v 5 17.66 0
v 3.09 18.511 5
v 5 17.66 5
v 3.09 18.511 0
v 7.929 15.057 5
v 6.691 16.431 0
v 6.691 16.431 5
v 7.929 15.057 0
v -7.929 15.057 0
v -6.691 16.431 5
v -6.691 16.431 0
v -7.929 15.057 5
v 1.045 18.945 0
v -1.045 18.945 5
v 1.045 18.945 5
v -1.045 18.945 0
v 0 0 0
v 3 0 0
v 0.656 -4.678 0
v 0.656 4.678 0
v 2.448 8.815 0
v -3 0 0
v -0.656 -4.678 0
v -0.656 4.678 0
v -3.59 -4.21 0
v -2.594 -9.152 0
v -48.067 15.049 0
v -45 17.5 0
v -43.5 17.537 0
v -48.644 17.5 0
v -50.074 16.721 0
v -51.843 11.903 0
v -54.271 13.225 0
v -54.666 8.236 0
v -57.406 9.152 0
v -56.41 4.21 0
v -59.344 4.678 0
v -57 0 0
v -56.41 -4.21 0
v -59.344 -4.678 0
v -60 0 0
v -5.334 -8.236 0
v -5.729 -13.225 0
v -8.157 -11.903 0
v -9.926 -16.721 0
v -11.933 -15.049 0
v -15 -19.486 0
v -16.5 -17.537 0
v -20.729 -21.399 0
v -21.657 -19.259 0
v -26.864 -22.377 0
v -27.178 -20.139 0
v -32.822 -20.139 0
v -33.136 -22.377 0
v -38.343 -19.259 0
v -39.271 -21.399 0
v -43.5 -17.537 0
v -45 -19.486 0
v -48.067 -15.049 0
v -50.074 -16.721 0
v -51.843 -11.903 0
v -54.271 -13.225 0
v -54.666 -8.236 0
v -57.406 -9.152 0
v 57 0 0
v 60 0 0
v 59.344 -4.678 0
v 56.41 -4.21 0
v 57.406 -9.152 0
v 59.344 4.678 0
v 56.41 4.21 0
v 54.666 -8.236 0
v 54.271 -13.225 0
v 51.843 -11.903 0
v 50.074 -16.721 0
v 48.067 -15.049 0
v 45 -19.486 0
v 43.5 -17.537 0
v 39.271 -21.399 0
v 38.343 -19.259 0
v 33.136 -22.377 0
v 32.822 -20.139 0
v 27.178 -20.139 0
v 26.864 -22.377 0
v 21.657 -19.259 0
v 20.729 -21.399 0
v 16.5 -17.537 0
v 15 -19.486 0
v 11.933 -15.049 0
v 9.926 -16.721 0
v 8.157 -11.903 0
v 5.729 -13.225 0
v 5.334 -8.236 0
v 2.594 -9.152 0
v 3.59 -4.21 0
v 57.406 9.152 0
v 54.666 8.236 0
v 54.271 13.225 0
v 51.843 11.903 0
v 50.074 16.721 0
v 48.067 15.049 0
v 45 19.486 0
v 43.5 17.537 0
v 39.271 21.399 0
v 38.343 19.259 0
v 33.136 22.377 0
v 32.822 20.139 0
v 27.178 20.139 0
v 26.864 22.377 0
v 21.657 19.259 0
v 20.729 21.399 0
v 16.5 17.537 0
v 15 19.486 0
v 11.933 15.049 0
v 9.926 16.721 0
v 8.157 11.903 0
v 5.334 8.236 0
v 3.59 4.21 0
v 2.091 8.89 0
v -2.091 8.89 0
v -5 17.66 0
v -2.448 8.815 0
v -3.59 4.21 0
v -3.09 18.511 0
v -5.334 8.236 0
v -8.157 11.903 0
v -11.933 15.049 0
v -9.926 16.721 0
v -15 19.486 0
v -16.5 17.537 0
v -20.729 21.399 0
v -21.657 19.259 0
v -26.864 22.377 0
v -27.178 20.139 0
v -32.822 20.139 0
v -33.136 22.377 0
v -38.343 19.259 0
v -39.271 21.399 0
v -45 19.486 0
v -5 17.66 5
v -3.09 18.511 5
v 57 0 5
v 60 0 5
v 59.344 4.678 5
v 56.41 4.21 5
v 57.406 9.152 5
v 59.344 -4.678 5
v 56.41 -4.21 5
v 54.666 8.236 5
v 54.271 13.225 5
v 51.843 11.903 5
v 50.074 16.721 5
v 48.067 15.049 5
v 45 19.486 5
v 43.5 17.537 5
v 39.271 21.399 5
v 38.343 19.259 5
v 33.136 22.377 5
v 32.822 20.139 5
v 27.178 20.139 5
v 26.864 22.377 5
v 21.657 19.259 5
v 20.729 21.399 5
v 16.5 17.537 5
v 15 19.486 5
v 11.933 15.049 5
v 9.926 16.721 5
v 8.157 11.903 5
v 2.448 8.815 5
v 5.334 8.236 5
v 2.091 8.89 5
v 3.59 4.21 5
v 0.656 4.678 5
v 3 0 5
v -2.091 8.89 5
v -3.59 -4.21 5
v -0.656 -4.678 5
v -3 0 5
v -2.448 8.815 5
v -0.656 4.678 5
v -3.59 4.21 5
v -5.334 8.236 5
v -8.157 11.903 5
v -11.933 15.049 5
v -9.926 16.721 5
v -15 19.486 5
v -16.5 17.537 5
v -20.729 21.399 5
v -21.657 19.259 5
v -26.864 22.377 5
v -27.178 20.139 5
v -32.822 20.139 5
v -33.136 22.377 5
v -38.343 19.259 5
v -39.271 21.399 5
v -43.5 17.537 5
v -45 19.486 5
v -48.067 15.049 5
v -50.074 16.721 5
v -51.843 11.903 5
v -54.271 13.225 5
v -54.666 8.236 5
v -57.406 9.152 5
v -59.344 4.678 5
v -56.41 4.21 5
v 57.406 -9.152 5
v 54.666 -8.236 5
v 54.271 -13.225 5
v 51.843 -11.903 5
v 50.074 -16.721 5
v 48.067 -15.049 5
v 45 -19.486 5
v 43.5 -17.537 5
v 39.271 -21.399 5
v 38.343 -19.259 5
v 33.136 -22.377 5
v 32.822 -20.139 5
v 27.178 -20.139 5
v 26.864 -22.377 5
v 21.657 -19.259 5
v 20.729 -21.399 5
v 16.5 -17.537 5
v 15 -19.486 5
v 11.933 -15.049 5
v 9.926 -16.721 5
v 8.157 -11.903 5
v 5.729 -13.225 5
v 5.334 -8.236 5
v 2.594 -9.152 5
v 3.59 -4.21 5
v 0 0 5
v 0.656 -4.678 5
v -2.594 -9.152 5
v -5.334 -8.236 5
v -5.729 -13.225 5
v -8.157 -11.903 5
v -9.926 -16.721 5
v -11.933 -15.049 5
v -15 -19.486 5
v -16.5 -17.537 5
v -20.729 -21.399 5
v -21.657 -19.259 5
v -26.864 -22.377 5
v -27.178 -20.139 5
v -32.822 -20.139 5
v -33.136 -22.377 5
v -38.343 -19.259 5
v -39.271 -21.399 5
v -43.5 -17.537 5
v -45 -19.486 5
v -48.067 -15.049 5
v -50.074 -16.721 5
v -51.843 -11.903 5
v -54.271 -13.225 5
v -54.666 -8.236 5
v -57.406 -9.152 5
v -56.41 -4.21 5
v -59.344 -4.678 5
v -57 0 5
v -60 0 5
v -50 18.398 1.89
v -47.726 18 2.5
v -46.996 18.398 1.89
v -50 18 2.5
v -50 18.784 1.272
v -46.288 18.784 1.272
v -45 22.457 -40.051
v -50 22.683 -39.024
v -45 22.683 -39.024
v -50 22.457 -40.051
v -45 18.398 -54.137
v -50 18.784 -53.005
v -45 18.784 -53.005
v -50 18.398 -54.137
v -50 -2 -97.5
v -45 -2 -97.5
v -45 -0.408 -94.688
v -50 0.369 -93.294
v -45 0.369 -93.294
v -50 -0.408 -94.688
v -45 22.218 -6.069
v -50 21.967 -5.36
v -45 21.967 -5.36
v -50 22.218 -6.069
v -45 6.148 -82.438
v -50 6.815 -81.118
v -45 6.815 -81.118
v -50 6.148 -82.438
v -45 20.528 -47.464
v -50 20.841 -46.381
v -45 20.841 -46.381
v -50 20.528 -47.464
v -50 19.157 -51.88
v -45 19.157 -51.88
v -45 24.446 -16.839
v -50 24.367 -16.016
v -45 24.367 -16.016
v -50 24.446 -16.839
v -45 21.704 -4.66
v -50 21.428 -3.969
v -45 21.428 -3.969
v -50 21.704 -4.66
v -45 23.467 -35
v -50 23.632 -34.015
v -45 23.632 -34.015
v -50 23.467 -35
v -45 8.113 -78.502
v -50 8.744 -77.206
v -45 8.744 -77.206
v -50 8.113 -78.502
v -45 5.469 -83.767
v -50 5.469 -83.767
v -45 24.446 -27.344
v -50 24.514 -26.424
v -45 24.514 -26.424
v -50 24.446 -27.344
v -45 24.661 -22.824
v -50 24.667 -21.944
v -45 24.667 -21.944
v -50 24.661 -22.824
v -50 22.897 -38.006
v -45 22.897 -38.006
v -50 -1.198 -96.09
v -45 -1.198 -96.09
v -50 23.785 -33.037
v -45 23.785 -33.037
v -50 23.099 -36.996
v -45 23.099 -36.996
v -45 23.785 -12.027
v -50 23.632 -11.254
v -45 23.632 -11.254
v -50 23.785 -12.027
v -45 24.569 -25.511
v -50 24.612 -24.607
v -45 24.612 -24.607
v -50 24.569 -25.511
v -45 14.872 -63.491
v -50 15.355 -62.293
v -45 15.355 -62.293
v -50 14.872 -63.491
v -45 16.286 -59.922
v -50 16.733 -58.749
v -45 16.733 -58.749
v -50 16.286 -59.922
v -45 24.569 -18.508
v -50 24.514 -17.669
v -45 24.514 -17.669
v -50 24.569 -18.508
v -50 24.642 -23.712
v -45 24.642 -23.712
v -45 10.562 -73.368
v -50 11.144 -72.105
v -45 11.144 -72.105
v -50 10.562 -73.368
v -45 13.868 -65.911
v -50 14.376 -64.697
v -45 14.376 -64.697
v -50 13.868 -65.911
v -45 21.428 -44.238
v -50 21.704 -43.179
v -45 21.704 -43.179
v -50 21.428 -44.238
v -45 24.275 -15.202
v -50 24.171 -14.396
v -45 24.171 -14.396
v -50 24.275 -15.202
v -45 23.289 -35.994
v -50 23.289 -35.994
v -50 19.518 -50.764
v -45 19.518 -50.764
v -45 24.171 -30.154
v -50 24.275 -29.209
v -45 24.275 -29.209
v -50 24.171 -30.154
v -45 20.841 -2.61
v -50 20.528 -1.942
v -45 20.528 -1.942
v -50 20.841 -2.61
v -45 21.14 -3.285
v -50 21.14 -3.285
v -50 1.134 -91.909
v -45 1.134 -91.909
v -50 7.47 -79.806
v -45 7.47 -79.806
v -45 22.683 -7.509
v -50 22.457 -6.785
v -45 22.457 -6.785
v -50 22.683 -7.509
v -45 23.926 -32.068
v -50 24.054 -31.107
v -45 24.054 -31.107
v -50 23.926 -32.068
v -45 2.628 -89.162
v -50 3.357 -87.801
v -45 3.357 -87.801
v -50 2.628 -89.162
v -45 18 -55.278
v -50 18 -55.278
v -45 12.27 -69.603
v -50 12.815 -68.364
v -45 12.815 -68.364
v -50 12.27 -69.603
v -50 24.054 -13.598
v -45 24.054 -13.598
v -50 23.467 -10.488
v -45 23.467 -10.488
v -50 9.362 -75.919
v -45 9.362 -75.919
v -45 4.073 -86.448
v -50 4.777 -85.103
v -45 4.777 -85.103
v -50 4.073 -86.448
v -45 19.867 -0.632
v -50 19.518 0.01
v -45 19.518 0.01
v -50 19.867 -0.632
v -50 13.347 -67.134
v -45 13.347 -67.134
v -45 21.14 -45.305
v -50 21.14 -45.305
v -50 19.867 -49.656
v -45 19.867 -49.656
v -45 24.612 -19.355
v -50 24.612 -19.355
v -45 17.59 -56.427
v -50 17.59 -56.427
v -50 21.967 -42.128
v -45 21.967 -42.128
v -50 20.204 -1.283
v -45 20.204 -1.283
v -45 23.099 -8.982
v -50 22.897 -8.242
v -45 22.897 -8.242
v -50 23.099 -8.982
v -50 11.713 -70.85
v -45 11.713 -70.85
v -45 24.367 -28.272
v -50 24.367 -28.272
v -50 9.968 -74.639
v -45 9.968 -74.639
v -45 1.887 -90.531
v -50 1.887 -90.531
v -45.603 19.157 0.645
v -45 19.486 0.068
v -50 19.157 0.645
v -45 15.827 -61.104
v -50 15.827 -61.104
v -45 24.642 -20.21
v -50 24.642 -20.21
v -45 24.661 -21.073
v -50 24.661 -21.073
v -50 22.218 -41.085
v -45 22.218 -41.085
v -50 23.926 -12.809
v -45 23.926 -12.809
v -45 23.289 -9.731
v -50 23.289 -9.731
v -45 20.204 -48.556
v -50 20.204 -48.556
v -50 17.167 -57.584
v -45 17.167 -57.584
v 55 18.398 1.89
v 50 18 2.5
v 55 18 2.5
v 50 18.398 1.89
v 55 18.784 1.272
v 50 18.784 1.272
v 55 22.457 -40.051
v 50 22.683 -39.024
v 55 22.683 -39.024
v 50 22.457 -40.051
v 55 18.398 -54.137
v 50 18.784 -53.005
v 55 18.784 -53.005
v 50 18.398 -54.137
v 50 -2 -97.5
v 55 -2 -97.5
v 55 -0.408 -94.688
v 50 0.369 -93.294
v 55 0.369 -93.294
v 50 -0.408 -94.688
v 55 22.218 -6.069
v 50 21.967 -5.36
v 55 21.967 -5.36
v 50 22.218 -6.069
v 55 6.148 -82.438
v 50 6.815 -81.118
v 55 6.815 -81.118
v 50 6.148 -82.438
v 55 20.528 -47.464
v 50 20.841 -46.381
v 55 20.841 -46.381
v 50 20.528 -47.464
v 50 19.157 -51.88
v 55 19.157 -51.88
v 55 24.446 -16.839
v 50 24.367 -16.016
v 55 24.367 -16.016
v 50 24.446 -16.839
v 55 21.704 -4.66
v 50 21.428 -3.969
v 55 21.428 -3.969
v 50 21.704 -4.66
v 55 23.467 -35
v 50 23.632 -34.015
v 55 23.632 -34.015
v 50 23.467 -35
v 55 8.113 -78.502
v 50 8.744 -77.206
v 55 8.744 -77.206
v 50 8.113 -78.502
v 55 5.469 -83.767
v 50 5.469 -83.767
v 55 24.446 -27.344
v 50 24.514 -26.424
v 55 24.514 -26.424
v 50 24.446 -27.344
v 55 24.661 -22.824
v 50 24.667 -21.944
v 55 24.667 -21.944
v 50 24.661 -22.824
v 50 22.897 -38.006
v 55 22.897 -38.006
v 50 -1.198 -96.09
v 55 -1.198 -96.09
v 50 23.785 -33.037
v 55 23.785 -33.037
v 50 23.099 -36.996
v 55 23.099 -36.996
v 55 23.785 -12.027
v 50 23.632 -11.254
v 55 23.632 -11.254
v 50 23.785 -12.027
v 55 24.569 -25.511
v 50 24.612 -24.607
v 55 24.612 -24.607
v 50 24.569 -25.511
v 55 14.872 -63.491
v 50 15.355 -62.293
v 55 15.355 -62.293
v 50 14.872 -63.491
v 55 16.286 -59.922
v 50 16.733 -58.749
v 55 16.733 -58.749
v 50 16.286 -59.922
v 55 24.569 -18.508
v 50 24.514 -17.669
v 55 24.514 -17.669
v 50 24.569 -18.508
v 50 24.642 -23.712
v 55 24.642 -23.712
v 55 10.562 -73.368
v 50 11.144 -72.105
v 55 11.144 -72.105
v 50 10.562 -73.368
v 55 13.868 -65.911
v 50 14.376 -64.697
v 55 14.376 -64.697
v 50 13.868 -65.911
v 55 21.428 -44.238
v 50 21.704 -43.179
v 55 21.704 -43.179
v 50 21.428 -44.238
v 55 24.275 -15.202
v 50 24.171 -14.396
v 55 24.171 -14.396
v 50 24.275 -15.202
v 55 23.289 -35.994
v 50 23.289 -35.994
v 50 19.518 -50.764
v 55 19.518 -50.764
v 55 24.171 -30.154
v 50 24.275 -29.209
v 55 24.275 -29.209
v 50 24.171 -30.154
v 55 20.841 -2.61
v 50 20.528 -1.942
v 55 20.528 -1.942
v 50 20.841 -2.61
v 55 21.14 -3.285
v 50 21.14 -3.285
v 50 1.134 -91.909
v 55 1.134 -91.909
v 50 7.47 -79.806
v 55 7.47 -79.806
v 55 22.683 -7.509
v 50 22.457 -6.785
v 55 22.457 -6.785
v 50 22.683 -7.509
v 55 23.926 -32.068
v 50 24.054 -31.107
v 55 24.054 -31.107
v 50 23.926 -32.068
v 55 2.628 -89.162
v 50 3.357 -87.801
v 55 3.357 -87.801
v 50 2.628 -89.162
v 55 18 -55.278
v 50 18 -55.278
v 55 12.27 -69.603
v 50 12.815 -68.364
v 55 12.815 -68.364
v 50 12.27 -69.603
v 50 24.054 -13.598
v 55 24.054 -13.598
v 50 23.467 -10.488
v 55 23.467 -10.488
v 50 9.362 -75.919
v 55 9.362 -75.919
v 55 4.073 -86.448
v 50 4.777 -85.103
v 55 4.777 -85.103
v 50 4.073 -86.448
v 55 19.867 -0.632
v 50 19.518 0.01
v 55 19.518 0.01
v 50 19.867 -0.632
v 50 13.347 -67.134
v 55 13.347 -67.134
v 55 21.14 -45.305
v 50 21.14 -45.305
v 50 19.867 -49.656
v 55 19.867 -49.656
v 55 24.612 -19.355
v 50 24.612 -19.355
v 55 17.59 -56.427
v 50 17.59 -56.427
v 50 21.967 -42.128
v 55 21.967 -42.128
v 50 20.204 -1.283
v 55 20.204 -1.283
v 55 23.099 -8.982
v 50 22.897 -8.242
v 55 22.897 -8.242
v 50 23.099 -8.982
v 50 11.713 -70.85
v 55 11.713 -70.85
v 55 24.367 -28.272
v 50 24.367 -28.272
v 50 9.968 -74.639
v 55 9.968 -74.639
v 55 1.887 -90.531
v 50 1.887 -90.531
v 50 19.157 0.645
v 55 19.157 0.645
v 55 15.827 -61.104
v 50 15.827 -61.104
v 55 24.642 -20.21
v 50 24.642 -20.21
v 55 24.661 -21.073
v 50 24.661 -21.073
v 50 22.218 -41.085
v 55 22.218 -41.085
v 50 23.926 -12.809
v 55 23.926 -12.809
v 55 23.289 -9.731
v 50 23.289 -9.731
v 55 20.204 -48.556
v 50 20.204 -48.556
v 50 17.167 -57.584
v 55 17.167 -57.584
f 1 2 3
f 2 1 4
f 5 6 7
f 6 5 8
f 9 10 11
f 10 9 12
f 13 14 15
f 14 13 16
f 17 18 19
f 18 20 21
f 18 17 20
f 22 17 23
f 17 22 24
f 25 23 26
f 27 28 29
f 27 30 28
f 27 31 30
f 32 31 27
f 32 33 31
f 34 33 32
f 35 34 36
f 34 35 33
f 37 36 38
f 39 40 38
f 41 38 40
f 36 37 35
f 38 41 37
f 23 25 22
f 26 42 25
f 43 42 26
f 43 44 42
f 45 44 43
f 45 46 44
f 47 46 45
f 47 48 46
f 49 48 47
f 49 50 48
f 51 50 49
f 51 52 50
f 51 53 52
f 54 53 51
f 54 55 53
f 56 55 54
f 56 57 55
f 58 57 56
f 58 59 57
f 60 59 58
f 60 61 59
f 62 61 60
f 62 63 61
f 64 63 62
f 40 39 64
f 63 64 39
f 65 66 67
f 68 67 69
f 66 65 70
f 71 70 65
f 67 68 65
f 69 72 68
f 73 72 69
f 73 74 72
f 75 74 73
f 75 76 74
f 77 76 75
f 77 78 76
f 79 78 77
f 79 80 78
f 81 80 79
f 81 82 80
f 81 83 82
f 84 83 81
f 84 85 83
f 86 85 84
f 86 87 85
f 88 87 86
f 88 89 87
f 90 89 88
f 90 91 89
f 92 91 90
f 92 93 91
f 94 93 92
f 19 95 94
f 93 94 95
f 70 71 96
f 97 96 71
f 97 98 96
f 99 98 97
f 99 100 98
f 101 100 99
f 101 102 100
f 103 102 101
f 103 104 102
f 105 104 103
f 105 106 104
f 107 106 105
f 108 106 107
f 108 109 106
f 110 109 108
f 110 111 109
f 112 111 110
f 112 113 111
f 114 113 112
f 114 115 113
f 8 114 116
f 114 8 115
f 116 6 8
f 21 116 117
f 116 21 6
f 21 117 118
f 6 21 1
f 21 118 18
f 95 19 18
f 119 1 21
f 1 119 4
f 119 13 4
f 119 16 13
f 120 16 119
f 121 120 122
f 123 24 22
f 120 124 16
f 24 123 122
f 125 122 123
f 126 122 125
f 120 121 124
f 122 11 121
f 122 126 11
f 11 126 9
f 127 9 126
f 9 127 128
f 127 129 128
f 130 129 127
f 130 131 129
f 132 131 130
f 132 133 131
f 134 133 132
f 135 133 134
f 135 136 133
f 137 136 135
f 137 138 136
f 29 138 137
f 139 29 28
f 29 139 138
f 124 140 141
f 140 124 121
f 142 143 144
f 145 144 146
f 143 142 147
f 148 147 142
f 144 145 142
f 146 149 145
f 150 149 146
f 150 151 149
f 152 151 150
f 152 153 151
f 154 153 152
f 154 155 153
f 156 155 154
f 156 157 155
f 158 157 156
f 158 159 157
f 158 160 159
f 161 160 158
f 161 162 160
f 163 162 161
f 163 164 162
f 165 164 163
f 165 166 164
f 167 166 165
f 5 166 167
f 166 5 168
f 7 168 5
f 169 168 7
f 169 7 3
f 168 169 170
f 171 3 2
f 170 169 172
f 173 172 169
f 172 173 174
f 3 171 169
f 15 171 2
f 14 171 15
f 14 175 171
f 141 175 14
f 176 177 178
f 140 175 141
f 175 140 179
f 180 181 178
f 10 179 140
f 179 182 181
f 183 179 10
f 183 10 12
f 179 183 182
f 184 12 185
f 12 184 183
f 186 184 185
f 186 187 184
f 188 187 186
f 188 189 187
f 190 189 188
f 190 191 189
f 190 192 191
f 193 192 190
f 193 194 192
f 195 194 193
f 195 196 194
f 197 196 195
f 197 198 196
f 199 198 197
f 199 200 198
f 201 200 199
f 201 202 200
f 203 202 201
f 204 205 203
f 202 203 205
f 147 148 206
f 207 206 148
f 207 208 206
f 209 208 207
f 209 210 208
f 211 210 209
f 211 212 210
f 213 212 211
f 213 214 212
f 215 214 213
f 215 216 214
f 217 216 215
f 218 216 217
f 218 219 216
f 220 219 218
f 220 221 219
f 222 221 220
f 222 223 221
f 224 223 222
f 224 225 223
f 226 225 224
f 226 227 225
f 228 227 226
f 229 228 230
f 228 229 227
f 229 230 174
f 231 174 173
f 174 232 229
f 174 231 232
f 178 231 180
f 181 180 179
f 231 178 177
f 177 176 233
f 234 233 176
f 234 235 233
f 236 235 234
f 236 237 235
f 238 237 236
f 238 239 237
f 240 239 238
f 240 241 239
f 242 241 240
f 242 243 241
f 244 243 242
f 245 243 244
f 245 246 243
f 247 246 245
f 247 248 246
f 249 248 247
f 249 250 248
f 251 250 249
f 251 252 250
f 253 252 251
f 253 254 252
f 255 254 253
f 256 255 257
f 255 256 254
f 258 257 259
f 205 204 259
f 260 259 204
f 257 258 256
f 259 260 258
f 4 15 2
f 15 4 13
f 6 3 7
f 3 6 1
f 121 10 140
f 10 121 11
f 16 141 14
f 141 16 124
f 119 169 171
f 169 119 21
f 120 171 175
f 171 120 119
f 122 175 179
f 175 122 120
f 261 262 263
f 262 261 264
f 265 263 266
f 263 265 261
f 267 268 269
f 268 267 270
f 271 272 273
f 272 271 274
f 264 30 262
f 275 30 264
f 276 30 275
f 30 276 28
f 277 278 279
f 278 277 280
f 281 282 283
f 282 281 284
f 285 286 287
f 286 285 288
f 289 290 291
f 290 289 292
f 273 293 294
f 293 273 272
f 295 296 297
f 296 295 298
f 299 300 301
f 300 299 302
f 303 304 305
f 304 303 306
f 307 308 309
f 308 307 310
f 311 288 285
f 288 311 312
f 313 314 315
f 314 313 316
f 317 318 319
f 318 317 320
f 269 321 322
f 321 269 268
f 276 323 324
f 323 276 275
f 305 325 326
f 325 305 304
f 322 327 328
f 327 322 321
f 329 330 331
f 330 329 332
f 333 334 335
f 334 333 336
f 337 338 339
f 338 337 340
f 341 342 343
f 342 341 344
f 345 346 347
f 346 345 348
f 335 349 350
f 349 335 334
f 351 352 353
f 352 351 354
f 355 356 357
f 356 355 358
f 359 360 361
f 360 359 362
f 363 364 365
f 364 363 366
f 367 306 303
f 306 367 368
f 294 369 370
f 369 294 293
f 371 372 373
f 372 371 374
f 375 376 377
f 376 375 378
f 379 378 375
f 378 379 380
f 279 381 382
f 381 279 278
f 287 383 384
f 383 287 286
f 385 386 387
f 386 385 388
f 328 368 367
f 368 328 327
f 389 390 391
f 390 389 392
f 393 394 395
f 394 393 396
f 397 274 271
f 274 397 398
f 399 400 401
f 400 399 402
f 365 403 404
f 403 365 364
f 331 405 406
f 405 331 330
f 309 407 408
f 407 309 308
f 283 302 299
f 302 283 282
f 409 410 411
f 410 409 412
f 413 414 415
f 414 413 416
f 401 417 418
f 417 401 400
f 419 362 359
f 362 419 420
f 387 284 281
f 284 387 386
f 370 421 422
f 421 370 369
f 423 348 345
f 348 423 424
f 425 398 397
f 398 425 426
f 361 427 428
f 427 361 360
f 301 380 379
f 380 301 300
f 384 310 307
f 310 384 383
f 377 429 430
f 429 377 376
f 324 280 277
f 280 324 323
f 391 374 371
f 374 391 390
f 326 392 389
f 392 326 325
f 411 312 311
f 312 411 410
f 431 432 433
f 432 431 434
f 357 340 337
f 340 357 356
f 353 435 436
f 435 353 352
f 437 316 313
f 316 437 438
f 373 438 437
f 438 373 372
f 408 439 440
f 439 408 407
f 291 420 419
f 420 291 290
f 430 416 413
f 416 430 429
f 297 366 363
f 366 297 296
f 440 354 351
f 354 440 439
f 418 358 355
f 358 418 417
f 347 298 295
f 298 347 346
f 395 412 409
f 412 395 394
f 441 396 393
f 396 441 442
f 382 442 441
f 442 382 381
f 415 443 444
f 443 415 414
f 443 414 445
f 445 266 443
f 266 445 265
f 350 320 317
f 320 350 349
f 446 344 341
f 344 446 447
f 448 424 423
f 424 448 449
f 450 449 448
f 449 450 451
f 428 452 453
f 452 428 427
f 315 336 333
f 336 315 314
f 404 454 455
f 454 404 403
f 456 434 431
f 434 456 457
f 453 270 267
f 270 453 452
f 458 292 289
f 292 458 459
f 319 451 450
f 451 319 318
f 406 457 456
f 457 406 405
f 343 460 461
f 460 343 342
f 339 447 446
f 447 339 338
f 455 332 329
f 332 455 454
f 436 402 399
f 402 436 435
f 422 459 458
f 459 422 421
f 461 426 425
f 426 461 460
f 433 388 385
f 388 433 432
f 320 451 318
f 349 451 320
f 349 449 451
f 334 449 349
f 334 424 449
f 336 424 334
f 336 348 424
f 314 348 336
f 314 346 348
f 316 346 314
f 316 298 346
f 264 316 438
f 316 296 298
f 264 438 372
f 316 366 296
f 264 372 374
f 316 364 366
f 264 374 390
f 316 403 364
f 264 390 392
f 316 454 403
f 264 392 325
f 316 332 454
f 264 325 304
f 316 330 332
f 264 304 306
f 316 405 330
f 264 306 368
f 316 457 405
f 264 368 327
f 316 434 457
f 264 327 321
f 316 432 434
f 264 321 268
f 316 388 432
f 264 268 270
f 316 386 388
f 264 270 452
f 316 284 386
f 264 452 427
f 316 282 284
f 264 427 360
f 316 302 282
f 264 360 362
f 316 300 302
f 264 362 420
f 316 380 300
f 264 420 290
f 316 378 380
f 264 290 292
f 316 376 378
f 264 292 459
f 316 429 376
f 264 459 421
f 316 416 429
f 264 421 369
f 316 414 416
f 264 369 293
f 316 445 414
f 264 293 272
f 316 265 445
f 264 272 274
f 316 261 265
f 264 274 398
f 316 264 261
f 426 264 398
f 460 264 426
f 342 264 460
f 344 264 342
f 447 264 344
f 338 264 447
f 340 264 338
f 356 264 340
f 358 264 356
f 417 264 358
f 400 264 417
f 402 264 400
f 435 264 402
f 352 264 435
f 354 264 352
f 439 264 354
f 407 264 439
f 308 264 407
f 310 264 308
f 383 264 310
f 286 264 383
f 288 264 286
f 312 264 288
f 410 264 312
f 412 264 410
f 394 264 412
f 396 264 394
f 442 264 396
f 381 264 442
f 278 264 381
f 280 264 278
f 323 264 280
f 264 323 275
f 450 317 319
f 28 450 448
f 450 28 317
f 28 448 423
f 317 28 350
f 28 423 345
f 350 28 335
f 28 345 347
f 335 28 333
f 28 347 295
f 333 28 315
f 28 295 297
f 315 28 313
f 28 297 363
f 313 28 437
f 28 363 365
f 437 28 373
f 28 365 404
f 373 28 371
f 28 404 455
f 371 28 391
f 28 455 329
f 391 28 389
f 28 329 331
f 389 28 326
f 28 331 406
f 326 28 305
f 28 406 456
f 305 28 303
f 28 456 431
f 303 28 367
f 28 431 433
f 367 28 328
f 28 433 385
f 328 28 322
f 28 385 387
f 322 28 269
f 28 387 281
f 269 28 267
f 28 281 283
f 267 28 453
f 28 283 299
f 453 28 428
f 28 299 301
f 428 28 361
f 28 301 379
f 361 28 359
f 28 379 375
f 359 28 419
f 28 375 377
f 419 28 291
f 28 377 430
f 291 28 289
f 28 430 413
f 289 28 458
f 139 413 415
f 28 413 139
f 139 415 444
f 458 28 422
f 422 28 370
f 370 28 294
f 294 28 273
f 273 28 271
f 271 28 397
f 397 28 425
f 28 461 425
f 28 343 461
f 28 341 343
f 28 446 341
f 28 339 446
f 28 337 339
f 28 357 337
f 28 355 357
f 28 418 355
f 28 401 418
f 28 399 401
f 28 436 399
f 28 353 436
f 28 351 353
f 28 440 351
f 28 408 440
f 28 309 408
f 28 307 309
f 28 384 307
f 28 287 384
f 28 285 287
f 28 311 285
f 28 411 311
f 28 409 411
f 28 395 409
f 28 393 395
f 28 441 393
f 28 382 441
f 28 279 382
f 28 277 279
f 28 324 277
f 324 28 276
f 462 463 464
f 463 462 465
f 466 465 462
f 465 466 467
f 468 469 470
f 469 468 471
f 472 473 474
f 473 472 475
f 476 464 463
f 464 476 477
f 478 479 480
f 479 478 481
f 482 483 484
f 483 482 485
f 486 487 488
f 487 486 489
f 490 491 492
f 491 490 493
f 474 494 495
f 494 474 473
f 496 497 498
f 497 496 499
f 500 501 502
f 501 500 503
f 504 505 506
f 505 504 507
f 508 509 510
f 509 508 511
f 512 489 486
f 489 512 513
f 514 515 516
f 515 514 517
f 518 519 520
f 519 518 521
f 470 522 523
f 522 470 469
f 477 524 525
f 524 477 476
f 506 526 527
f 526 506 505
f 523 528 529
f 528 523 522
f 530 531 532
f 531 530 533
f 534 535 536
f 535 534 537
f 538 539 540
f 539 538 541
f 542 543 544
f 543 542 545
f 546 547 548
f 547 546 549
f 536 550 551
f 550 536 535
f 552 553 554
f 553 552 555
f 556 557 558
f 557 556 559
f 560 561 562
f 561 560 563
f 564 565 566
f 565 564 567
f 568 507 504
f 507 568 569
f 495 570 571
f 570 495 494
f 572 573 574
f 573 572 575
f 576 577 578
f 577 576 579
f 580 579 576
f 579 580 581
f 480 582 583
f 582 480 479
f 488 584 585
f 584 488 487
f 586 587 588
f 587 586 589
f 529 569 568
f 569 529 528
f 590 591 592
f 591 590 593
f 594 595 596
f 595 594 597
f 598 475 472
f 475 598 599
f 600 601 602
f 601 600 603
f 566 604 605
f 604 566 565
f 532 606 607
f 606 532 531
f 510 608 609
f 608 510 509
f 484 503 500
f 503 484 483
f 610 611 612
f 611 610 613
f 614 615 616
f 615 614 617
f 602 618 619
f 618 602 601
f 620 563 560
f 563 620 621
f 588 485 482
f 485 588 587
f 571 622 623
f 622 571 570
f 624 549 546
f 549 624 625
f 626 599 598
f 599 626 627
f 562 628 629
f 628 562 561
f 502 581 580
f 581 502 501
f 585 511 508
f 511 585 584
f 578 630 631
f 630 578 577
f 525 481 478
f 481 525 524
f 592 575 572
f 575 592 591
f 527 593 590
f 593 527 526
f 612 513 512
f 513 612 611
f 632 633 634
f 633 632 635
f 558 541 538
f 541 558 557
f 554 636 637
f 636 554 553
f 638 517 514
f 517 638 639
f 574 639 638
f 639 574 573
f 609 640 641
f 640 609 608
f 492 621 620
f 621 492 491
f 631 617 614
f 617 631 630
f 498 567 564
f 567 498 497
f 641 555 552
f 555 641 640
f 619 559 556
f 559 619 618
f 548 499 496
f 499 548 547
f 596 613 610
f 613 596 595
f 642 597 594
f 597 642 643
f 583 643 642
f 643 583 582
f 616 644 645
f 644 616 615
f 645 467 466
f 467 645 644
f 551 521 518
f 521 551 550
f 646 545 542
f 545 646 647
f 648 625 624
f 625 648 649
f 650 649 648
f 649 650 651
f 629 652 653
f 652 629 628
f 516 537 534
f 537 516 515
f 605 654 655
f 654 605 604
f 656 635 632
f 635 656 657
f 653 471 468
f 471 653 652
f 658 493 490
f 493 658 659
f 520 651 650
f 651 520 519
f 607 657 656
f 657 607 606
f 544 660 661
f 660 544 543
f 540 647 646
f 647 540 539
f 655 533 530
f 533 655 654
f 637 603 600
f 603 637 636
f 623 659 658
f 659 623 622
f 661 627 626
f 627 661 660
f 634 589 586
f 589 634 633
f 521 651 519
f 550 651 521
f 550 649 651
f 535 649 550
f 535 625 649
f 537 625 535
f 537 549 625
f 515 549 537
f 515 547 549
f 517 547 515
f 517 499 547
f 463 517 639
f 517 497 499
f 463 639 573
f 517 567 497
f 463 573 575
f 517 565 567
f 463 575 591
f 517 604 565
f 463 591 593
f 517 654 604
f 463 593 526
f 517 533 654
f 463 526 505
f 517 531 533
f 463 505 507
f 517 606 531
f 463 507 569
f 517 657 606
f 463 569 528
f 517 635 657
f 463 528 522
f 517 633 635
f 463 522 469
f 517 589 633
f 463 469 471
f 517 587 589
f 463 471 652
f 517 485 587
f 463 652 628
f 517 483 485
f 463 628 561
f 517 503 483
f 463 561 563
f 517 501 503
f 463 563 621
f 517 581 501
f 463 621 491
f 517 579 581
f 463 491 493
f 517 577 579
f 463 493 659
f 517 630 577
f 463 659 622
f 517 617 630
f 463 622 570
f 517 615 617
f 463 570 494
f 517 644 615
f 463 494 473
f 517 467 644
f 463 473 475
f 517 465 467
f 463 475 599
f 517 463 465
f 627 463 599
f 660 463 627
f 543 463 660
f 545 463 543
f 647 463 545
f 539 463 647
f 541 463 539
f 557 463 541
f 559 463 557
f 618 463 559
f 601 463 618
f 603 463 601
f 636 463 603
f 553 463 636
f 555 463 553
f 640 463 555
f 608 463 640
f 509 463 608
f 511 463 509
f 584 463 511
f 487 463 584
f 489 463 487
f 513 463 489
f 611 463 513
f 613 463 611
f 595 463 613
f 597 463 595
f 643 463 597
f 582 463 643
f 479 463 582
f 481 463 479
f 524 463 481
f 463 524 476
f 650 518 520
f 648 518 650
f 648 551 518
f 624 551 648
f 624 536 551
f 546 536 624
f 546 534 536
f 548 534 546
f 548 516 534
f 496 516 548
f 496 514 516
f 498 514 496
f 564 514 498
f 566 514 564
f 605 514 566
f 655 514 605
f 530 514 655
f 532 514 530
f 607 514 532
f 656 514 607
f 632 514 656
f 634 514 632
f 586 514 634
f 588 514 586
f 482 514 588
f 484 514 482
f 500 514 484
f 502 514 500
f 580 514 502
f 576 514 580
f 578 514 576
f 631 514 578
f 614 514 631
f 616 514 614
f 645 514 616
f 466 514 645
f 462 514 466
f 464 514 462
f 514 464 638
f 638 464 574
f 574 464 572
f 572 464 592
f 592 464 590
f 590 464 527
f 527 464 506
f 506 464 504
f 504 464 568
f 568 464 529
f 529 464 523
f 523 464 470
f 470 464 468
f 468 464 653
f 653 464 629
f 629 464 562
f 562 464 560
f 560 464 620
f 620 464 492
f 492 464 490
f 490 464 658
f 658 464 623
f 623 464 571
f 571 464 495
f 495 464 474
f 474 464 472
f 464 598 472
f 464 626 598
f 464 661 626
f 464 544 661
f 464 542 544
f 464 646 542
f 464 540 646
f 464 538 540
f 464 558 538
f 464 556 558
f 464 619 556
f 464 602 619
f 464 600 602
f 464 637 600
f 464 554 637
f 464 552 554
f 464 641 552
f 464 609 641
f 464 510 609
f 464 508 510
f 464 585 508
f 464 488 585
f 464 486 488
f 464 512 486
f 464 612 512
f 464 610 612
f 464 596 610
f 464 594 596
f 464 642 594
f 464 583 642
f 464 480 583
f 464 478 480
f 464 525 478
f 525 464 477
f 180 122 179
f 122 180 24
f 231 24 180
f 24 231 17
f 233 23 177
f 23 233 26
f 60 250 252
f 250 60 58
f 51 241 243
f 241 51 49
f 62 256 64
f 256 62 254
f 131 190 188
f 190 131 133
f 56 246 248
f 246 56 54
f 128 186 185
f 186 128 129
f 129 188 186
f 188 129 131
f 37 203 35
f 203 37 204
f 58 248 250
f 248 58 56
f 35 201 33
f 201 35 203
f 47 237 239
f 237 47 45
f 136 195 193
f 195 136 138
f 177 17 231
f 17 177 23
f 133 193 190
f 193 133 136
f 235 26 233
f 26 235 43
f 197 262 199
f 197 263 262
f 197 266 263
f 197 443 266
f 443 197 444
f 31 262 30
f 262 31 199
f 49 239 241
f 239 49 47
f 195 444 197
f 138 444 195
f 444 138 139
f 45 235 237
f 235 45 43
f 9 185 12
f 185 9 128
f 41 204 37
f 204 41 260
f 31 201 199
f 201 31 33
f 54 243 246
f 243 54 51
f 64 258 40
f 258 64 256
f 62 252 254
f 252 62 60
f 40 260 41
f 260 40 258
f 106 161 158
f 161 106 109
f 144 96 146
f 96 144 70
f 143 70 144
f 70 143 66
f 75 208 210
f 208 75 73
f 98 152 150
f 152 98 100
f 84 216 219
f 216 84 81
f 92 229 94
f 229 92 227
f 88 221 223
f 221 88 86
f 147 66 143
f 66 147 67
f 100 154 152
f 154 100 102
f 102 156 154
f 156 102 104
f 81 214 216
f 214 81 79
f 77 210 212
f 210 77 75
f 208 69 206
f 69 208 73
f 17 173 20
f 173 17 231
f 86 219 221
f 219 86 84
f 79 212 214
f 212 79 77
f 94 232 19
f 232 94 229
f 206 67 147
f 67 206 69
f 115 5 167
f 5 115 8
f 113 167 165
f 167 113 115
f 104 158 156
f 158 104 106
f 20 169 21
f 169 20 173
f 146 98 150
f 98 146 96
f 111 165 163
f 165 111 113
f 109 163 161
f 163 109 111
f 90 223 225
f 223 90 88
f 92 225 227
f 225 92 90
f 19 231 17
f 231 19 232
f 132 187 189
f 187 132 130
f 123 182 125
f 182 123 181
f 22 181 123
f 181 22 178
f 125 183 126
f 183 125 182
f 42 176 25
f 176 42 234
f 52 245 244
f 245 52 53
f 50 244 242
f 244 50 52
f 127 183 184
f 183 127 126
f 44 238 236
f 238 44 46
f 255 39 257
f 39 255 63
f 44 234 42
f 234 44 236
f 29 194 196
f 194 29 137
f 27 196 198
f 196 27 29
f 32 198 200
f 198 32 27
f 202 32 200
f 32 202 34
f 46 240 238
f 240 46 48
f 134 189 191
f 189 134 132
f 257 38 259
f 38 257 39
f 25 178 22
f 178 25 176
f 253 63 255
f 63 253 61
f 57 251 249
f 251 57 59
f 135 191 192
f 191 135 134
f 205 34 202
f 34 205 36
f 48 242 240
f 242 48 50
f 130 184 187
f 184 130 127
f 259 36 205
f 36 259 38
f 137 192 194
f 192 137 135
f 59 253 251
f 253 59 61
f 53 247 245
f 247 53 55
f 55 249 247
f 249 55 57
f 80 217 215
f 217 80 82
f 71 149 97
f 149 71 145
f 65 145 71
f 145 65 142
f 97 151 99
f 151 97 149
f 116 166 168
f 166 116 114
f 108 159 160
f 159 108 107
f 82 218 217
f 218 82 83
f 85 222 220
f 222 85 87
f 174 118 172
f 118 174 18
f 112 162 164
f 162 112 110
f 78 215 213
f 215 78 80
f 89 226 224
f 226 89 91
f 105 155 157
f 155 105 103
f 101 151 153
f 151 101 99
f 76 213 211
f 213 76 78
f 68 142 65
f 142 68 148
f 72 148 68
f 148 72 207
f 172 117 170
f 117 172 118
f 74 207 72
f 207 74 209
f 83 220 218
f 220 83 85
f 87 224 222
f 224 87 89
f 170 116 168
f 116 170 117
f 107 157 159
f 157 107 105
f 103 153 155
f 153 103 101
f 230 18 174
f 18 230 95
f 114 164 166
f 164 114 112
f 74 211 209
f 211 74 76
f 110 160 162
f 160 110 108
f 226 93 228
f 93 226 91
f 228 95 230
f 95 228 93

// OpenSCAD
difference() {
	union() {
		translate(v = [-30.0000000000, 0, 0]) {
			scale(v = [0.6000000000, 0.4500000000, 1]) {
				cylinder(h = 5, r = 50);
			}
		}
		translate(v = [30.0000000000, 0, 0]) {
			scale(v = [0.6000000000, 0.4500000000, 1]) {
				cylinder(h = 5, r = 50);
			}
		}
		translate(v = [0, 9.0000000000, 0]) {
			difference() {
				cylinder(h = 5, r = 10.0000000000);
				translate(v = [0, -20, 0]) {
					cylinder(h = 5, r = 20);
				}
			}
		}
		translate(v = [-50.0000000000, 18.0000000000, 2.5000000000]) {
			rotate(a = [90, 90, 90]) {
				difference() {
					linear_extrude(height = 5) {
						polygon(points = [[0.0000000000, 0.0000000000], [0.6101418223, 0.3979185797], [1.2284460769, 0.7835935109], [1.8549127640, 1.1570247934], [2.4895418835, 1.5182124273], [3.1323334354, 1.8671564126], [3.7832874197, 2.2038567493], [4.4424038363, 2.5283134374], [5.1096826854, 2.8405264769], [5.7851239669, 3.1404958678], [6.4687276808, 3.4282216100], [7.1604938272, 3.7037037037], [7.8604224059, 3.9669421488], [8.5685134170, 4.2179369452], [9.2847668605, 4.4566880931], [10.0091827365, 4.6831955923], [10.7417610448, 4.8974594429], [11.4825017855, 5.0994796449], [12.2314049587, 5.2892561983], [12.9884705642, 5.4667891032], [13.7536986022, 5.6320783594], [14.5270890725, 5.7851239669], [15.3086419753, 5.9259259259], [16.0983573105, 6.0544842363], [16.8962350781, 6.1707988981], [17.7022752780, 6.2748699112], [18.5164779104, 6.3666972758], [19.3388429752, 6.4462809917], [20.1693704724, 6.5136210591], [21.0080604020, 6.5687174778], [21.8549127640, 6.6115702479], [22.7099275584, 6.6421793695], [23.5731047852, 6.6605448424], [24.4444444444, 6.6666666667], [25.3239465361, 6.6605448424], [26.2116110601, 6.6421793695], [27.1074380165, 6.6115702479], [28.0114274054, 6.5687174778], [28.9235792266, 6.5136210591], [29.8438934803, 6.4462809917], [30.7723701663, 6.3666972758], [31.7090092848, 6.2748699112], [32.6538108356, 6.1707988981], [33.6067748189, 6.0544842363], [34.5679012346, 5.9259259259], [35.5371900826, 5.7851239669], [36.5146413631, 5.6320783594], [37.5002550760, 5.4667891032], [38.4940312213, 5.2892561983], [39.4959697990, 5.0994796449], [40.5060708091, 4.8974594429], [41.5243342516, 4.6831955923], [42.5507601265, 4.4566880931], [43.5853484338, 4.2179369452], [44.6280991736, 3.9669421488], [45.6790123457, 3.7037037037], [46.7380879502, 3.4282216100], [47.8053259871, 3.1404958678], [48.8807264565, 2.8405264769], [49.9642893582, 2.5283134374], [51.0560146924, 2.2038567493], [52.1559024589, 1.8671564126], [53.2639526579, 1.5182124273], [54.3801652893, 1.1570247934], [55.5045403530, 0.7835935109], [56.6370778492, 0.3979185797], [57.7777777778, -0.0000000000], [58.9266401388, -0.4101622283], [60.0836649321, -0.8325681053], [61.2488521579, -1.2672176309], [62.4222018161, -1.7141108050], [63.6037139067, -2.1732476278], [64.7933884298, -2.6446280992], [65.9912253852, -3.1282522192], [67.1972247730, -3.6241199878], [68.4113865932, -4.1322314050], [69.6337108458, -4.6525864708], [70.8641975309, -5.1851851852], [72.1028466483, -5.7300275482], [73.3496581981, -6.2871135598], [74.6046321804, -6.8564432201], [75.8677685950, -7.4380165289], [77.1390674421, -8.0318334864], [78.4185287216, -8.6378940924], [79.7061524334, -9.2561983471], [81.0019385777, -9.8867462504], [82.3058871544, -10.5295378023], [83.6179981635, -11.1845730028], [84.9382716049, -11.8518518519], [86.2667074788, -12.5313743496], [87.6033057851, -13.2231404959], [88.9480665238, -13.9271502908], [90.3009896949, -14.6434037343], [91.6620752984, -15.3719008264], [93.0313233344, -16.1126415672], [94.4087338027, -16.8656259565], [95.7943067034, -17.6308539945], [97.1880420365, -18.4083256811], [98.5899398021, -19.1980410162], [100.0000000000, -20.0000000000]]);
					}
					translate(v = [20.0000000000, 20, 4.5000000000]) {
						linear_extrude(height = 0.5000000000) {
							text(size = 10, text = "Dinking Buddies");
						}
					}
				}
			}
		}
		translate(v = [50.0000000000, 18.0000000000, 2.5000000000]) {
			rotate(a = [90, 90, 90]) {
				difference() {
					linear_extrude(height = 5) {
						polygon(points = [[0.0000000000, 0.0000000000], [0.6101418223, 0.3979185797], [1.2284460769, 0.7835935109], [1.8549127640, 1.1570247934], [2.4895418835, 1.5182124273], [3.1323334354, 1.8671564126], [3.7832874197, 2.2038567493], [4.4424038363, 2.5283134374], [5.1096826854, 2.8405264769], [5.7851239669, 3.1404958678], [6.4687276808, 3.4282216100], [7.1604938272, 3.7037037037], [7.8604224059, 3.9669421488], [8.5685134170, 4.2179369452], [9.2847668605, 4.4566880931], [10.0091827365, 4.6831955923], [10.7417610448, 4.8974594429], [11.4825017855, 5.0994796449], [12.2314049587, 5.2892561983], [12.9884705642, 5.4667891032], [13.7536986022, 5.6320783594], [14.5270890725, 5.7851239669], [15.3086419753, 5.9259259259], [16.0983573105, 6.0544842363], [16.8962350781, 6.1707988981], [17.7022752780, 6.2748699112], [18.5164779104, 6.3666972758], [19.3388429752, 6.4462809917], [20.1693704724, 6.5136210591], [21.0080604020, 6.5687174778], [21.8549127640, 6.6115702479], [22.7099275584, 6.6421793695], [23.5731047852, 6.6605448424], [24.4444444444, 6.6666666667], [25.3239465361, 6.6605448424], [26.2116110601, 6.6421793695], [27.1074380165, 6.6115702479], [28.0114274054, 6.5687174778], [28.9235792266, 6.5136210591], [29.8438934803, 6.4462809917], [30.7723701663, 6.3666972758], [31.7090092848, 6.2748699112], [32.6538108356, 6.1707988981], [33.6067748189, 6.0544842363], [34.5679012346, 5.9259259259], [35.5371900826, 5.7851239669], [36.5146413631, 5.6320783594], [37.5002550760, 5.4667891032], [38.4940312213, 5.2892561983], [39.4959697990, 5.0994796449], [40.5060708091, 4.8974594429], [41.5243342516, 4.6831955923], [42.5507601265, 4.4566880931], [43.5853484338, 4.2179369452], [44.6280991736, 3.9669421488], [45.6790123457, 3.7037037037], [46.7380879502, 3.4282216100], [47.8053259871, 3.1404958678], [48.8807264565, 2.8405264769], [49.9642893582, 2.5283134374], [51.0560146924, 2.2038567493], [52.1559024589, 1.8671564126], [53.2639526579, 1.5182124273], [54.3801652893, 1.1570247934], [55.5045403530, 0.7835935109], [56.6370778492, 0.3979185797], [57.7777777778, -0.0000000000], [58.9266401388, -0.4101622283], [60.0836649321, -0.8325681053], [61.2488521579, -1.2672176309], [62.4222018161, -1.7141108050], [63.6037139067, -2.1732476278], [64.7933884298, -2.6446280992], [65.9912253852, -3.1282522192], [67.1972247730, -3.6241199878], [68.4113865932, -4.1322314050], [69.6337108458, -4.6525864708], [70.8641975309, -5.1851851852], [72.1028466483, -5.7300275482], [73.3496581981, -6.2871135598], [74.6046321804, -6.8564432201], [75.8677685950, -7.4380165289], [77.1390674421, -8.0318334864], [78.4185287216, -8.6378940924], [79.7061524334, -9.2561983471], [81.0019385777, -9.8867462504], [82.3058871544, -10.5295378023], [83.6179981635, -11.1845730028], [84.9382716049, -11.8518518519], [86.2667074788, -12.5313743496], [87.6033057851, -13.2231404959], [88.9480665238, -13.9271502908], [90.3009896949, -14.6434037343], [91.6620752984, -15.3719008264], [93.0313233344, -16.1126415672], [94.4087338027, -16.8656259565], [95.7943067034, -17.6308539945], [97.1880420365, -18.4083256811], [98.5899398021, -19.1980410162], [100.0000000000, -20.0000000000]]);
					}
					translate(v = [20.0000000000, 20, 4.5000000000]) {
						linear_extrude(height = 0.5000000000) {
							text(size = 10, text = "Dinking Buddies");
						}
					}
				}
			}
		}
	}
	translate(v = [-30.0000000000, 0, 0]) {
		scale(v = [0.5400000000, 0.4050000000, 1]) {
			cylinder(h = 6, r = 50);
		}
	}
	translate(v = [30.0000000000, 0, 0]) {
		scale(v = [0.5400000000, 0.4050000000, 1]) {
			cylinder(h = 6, r = 50);
		}
	}
}
